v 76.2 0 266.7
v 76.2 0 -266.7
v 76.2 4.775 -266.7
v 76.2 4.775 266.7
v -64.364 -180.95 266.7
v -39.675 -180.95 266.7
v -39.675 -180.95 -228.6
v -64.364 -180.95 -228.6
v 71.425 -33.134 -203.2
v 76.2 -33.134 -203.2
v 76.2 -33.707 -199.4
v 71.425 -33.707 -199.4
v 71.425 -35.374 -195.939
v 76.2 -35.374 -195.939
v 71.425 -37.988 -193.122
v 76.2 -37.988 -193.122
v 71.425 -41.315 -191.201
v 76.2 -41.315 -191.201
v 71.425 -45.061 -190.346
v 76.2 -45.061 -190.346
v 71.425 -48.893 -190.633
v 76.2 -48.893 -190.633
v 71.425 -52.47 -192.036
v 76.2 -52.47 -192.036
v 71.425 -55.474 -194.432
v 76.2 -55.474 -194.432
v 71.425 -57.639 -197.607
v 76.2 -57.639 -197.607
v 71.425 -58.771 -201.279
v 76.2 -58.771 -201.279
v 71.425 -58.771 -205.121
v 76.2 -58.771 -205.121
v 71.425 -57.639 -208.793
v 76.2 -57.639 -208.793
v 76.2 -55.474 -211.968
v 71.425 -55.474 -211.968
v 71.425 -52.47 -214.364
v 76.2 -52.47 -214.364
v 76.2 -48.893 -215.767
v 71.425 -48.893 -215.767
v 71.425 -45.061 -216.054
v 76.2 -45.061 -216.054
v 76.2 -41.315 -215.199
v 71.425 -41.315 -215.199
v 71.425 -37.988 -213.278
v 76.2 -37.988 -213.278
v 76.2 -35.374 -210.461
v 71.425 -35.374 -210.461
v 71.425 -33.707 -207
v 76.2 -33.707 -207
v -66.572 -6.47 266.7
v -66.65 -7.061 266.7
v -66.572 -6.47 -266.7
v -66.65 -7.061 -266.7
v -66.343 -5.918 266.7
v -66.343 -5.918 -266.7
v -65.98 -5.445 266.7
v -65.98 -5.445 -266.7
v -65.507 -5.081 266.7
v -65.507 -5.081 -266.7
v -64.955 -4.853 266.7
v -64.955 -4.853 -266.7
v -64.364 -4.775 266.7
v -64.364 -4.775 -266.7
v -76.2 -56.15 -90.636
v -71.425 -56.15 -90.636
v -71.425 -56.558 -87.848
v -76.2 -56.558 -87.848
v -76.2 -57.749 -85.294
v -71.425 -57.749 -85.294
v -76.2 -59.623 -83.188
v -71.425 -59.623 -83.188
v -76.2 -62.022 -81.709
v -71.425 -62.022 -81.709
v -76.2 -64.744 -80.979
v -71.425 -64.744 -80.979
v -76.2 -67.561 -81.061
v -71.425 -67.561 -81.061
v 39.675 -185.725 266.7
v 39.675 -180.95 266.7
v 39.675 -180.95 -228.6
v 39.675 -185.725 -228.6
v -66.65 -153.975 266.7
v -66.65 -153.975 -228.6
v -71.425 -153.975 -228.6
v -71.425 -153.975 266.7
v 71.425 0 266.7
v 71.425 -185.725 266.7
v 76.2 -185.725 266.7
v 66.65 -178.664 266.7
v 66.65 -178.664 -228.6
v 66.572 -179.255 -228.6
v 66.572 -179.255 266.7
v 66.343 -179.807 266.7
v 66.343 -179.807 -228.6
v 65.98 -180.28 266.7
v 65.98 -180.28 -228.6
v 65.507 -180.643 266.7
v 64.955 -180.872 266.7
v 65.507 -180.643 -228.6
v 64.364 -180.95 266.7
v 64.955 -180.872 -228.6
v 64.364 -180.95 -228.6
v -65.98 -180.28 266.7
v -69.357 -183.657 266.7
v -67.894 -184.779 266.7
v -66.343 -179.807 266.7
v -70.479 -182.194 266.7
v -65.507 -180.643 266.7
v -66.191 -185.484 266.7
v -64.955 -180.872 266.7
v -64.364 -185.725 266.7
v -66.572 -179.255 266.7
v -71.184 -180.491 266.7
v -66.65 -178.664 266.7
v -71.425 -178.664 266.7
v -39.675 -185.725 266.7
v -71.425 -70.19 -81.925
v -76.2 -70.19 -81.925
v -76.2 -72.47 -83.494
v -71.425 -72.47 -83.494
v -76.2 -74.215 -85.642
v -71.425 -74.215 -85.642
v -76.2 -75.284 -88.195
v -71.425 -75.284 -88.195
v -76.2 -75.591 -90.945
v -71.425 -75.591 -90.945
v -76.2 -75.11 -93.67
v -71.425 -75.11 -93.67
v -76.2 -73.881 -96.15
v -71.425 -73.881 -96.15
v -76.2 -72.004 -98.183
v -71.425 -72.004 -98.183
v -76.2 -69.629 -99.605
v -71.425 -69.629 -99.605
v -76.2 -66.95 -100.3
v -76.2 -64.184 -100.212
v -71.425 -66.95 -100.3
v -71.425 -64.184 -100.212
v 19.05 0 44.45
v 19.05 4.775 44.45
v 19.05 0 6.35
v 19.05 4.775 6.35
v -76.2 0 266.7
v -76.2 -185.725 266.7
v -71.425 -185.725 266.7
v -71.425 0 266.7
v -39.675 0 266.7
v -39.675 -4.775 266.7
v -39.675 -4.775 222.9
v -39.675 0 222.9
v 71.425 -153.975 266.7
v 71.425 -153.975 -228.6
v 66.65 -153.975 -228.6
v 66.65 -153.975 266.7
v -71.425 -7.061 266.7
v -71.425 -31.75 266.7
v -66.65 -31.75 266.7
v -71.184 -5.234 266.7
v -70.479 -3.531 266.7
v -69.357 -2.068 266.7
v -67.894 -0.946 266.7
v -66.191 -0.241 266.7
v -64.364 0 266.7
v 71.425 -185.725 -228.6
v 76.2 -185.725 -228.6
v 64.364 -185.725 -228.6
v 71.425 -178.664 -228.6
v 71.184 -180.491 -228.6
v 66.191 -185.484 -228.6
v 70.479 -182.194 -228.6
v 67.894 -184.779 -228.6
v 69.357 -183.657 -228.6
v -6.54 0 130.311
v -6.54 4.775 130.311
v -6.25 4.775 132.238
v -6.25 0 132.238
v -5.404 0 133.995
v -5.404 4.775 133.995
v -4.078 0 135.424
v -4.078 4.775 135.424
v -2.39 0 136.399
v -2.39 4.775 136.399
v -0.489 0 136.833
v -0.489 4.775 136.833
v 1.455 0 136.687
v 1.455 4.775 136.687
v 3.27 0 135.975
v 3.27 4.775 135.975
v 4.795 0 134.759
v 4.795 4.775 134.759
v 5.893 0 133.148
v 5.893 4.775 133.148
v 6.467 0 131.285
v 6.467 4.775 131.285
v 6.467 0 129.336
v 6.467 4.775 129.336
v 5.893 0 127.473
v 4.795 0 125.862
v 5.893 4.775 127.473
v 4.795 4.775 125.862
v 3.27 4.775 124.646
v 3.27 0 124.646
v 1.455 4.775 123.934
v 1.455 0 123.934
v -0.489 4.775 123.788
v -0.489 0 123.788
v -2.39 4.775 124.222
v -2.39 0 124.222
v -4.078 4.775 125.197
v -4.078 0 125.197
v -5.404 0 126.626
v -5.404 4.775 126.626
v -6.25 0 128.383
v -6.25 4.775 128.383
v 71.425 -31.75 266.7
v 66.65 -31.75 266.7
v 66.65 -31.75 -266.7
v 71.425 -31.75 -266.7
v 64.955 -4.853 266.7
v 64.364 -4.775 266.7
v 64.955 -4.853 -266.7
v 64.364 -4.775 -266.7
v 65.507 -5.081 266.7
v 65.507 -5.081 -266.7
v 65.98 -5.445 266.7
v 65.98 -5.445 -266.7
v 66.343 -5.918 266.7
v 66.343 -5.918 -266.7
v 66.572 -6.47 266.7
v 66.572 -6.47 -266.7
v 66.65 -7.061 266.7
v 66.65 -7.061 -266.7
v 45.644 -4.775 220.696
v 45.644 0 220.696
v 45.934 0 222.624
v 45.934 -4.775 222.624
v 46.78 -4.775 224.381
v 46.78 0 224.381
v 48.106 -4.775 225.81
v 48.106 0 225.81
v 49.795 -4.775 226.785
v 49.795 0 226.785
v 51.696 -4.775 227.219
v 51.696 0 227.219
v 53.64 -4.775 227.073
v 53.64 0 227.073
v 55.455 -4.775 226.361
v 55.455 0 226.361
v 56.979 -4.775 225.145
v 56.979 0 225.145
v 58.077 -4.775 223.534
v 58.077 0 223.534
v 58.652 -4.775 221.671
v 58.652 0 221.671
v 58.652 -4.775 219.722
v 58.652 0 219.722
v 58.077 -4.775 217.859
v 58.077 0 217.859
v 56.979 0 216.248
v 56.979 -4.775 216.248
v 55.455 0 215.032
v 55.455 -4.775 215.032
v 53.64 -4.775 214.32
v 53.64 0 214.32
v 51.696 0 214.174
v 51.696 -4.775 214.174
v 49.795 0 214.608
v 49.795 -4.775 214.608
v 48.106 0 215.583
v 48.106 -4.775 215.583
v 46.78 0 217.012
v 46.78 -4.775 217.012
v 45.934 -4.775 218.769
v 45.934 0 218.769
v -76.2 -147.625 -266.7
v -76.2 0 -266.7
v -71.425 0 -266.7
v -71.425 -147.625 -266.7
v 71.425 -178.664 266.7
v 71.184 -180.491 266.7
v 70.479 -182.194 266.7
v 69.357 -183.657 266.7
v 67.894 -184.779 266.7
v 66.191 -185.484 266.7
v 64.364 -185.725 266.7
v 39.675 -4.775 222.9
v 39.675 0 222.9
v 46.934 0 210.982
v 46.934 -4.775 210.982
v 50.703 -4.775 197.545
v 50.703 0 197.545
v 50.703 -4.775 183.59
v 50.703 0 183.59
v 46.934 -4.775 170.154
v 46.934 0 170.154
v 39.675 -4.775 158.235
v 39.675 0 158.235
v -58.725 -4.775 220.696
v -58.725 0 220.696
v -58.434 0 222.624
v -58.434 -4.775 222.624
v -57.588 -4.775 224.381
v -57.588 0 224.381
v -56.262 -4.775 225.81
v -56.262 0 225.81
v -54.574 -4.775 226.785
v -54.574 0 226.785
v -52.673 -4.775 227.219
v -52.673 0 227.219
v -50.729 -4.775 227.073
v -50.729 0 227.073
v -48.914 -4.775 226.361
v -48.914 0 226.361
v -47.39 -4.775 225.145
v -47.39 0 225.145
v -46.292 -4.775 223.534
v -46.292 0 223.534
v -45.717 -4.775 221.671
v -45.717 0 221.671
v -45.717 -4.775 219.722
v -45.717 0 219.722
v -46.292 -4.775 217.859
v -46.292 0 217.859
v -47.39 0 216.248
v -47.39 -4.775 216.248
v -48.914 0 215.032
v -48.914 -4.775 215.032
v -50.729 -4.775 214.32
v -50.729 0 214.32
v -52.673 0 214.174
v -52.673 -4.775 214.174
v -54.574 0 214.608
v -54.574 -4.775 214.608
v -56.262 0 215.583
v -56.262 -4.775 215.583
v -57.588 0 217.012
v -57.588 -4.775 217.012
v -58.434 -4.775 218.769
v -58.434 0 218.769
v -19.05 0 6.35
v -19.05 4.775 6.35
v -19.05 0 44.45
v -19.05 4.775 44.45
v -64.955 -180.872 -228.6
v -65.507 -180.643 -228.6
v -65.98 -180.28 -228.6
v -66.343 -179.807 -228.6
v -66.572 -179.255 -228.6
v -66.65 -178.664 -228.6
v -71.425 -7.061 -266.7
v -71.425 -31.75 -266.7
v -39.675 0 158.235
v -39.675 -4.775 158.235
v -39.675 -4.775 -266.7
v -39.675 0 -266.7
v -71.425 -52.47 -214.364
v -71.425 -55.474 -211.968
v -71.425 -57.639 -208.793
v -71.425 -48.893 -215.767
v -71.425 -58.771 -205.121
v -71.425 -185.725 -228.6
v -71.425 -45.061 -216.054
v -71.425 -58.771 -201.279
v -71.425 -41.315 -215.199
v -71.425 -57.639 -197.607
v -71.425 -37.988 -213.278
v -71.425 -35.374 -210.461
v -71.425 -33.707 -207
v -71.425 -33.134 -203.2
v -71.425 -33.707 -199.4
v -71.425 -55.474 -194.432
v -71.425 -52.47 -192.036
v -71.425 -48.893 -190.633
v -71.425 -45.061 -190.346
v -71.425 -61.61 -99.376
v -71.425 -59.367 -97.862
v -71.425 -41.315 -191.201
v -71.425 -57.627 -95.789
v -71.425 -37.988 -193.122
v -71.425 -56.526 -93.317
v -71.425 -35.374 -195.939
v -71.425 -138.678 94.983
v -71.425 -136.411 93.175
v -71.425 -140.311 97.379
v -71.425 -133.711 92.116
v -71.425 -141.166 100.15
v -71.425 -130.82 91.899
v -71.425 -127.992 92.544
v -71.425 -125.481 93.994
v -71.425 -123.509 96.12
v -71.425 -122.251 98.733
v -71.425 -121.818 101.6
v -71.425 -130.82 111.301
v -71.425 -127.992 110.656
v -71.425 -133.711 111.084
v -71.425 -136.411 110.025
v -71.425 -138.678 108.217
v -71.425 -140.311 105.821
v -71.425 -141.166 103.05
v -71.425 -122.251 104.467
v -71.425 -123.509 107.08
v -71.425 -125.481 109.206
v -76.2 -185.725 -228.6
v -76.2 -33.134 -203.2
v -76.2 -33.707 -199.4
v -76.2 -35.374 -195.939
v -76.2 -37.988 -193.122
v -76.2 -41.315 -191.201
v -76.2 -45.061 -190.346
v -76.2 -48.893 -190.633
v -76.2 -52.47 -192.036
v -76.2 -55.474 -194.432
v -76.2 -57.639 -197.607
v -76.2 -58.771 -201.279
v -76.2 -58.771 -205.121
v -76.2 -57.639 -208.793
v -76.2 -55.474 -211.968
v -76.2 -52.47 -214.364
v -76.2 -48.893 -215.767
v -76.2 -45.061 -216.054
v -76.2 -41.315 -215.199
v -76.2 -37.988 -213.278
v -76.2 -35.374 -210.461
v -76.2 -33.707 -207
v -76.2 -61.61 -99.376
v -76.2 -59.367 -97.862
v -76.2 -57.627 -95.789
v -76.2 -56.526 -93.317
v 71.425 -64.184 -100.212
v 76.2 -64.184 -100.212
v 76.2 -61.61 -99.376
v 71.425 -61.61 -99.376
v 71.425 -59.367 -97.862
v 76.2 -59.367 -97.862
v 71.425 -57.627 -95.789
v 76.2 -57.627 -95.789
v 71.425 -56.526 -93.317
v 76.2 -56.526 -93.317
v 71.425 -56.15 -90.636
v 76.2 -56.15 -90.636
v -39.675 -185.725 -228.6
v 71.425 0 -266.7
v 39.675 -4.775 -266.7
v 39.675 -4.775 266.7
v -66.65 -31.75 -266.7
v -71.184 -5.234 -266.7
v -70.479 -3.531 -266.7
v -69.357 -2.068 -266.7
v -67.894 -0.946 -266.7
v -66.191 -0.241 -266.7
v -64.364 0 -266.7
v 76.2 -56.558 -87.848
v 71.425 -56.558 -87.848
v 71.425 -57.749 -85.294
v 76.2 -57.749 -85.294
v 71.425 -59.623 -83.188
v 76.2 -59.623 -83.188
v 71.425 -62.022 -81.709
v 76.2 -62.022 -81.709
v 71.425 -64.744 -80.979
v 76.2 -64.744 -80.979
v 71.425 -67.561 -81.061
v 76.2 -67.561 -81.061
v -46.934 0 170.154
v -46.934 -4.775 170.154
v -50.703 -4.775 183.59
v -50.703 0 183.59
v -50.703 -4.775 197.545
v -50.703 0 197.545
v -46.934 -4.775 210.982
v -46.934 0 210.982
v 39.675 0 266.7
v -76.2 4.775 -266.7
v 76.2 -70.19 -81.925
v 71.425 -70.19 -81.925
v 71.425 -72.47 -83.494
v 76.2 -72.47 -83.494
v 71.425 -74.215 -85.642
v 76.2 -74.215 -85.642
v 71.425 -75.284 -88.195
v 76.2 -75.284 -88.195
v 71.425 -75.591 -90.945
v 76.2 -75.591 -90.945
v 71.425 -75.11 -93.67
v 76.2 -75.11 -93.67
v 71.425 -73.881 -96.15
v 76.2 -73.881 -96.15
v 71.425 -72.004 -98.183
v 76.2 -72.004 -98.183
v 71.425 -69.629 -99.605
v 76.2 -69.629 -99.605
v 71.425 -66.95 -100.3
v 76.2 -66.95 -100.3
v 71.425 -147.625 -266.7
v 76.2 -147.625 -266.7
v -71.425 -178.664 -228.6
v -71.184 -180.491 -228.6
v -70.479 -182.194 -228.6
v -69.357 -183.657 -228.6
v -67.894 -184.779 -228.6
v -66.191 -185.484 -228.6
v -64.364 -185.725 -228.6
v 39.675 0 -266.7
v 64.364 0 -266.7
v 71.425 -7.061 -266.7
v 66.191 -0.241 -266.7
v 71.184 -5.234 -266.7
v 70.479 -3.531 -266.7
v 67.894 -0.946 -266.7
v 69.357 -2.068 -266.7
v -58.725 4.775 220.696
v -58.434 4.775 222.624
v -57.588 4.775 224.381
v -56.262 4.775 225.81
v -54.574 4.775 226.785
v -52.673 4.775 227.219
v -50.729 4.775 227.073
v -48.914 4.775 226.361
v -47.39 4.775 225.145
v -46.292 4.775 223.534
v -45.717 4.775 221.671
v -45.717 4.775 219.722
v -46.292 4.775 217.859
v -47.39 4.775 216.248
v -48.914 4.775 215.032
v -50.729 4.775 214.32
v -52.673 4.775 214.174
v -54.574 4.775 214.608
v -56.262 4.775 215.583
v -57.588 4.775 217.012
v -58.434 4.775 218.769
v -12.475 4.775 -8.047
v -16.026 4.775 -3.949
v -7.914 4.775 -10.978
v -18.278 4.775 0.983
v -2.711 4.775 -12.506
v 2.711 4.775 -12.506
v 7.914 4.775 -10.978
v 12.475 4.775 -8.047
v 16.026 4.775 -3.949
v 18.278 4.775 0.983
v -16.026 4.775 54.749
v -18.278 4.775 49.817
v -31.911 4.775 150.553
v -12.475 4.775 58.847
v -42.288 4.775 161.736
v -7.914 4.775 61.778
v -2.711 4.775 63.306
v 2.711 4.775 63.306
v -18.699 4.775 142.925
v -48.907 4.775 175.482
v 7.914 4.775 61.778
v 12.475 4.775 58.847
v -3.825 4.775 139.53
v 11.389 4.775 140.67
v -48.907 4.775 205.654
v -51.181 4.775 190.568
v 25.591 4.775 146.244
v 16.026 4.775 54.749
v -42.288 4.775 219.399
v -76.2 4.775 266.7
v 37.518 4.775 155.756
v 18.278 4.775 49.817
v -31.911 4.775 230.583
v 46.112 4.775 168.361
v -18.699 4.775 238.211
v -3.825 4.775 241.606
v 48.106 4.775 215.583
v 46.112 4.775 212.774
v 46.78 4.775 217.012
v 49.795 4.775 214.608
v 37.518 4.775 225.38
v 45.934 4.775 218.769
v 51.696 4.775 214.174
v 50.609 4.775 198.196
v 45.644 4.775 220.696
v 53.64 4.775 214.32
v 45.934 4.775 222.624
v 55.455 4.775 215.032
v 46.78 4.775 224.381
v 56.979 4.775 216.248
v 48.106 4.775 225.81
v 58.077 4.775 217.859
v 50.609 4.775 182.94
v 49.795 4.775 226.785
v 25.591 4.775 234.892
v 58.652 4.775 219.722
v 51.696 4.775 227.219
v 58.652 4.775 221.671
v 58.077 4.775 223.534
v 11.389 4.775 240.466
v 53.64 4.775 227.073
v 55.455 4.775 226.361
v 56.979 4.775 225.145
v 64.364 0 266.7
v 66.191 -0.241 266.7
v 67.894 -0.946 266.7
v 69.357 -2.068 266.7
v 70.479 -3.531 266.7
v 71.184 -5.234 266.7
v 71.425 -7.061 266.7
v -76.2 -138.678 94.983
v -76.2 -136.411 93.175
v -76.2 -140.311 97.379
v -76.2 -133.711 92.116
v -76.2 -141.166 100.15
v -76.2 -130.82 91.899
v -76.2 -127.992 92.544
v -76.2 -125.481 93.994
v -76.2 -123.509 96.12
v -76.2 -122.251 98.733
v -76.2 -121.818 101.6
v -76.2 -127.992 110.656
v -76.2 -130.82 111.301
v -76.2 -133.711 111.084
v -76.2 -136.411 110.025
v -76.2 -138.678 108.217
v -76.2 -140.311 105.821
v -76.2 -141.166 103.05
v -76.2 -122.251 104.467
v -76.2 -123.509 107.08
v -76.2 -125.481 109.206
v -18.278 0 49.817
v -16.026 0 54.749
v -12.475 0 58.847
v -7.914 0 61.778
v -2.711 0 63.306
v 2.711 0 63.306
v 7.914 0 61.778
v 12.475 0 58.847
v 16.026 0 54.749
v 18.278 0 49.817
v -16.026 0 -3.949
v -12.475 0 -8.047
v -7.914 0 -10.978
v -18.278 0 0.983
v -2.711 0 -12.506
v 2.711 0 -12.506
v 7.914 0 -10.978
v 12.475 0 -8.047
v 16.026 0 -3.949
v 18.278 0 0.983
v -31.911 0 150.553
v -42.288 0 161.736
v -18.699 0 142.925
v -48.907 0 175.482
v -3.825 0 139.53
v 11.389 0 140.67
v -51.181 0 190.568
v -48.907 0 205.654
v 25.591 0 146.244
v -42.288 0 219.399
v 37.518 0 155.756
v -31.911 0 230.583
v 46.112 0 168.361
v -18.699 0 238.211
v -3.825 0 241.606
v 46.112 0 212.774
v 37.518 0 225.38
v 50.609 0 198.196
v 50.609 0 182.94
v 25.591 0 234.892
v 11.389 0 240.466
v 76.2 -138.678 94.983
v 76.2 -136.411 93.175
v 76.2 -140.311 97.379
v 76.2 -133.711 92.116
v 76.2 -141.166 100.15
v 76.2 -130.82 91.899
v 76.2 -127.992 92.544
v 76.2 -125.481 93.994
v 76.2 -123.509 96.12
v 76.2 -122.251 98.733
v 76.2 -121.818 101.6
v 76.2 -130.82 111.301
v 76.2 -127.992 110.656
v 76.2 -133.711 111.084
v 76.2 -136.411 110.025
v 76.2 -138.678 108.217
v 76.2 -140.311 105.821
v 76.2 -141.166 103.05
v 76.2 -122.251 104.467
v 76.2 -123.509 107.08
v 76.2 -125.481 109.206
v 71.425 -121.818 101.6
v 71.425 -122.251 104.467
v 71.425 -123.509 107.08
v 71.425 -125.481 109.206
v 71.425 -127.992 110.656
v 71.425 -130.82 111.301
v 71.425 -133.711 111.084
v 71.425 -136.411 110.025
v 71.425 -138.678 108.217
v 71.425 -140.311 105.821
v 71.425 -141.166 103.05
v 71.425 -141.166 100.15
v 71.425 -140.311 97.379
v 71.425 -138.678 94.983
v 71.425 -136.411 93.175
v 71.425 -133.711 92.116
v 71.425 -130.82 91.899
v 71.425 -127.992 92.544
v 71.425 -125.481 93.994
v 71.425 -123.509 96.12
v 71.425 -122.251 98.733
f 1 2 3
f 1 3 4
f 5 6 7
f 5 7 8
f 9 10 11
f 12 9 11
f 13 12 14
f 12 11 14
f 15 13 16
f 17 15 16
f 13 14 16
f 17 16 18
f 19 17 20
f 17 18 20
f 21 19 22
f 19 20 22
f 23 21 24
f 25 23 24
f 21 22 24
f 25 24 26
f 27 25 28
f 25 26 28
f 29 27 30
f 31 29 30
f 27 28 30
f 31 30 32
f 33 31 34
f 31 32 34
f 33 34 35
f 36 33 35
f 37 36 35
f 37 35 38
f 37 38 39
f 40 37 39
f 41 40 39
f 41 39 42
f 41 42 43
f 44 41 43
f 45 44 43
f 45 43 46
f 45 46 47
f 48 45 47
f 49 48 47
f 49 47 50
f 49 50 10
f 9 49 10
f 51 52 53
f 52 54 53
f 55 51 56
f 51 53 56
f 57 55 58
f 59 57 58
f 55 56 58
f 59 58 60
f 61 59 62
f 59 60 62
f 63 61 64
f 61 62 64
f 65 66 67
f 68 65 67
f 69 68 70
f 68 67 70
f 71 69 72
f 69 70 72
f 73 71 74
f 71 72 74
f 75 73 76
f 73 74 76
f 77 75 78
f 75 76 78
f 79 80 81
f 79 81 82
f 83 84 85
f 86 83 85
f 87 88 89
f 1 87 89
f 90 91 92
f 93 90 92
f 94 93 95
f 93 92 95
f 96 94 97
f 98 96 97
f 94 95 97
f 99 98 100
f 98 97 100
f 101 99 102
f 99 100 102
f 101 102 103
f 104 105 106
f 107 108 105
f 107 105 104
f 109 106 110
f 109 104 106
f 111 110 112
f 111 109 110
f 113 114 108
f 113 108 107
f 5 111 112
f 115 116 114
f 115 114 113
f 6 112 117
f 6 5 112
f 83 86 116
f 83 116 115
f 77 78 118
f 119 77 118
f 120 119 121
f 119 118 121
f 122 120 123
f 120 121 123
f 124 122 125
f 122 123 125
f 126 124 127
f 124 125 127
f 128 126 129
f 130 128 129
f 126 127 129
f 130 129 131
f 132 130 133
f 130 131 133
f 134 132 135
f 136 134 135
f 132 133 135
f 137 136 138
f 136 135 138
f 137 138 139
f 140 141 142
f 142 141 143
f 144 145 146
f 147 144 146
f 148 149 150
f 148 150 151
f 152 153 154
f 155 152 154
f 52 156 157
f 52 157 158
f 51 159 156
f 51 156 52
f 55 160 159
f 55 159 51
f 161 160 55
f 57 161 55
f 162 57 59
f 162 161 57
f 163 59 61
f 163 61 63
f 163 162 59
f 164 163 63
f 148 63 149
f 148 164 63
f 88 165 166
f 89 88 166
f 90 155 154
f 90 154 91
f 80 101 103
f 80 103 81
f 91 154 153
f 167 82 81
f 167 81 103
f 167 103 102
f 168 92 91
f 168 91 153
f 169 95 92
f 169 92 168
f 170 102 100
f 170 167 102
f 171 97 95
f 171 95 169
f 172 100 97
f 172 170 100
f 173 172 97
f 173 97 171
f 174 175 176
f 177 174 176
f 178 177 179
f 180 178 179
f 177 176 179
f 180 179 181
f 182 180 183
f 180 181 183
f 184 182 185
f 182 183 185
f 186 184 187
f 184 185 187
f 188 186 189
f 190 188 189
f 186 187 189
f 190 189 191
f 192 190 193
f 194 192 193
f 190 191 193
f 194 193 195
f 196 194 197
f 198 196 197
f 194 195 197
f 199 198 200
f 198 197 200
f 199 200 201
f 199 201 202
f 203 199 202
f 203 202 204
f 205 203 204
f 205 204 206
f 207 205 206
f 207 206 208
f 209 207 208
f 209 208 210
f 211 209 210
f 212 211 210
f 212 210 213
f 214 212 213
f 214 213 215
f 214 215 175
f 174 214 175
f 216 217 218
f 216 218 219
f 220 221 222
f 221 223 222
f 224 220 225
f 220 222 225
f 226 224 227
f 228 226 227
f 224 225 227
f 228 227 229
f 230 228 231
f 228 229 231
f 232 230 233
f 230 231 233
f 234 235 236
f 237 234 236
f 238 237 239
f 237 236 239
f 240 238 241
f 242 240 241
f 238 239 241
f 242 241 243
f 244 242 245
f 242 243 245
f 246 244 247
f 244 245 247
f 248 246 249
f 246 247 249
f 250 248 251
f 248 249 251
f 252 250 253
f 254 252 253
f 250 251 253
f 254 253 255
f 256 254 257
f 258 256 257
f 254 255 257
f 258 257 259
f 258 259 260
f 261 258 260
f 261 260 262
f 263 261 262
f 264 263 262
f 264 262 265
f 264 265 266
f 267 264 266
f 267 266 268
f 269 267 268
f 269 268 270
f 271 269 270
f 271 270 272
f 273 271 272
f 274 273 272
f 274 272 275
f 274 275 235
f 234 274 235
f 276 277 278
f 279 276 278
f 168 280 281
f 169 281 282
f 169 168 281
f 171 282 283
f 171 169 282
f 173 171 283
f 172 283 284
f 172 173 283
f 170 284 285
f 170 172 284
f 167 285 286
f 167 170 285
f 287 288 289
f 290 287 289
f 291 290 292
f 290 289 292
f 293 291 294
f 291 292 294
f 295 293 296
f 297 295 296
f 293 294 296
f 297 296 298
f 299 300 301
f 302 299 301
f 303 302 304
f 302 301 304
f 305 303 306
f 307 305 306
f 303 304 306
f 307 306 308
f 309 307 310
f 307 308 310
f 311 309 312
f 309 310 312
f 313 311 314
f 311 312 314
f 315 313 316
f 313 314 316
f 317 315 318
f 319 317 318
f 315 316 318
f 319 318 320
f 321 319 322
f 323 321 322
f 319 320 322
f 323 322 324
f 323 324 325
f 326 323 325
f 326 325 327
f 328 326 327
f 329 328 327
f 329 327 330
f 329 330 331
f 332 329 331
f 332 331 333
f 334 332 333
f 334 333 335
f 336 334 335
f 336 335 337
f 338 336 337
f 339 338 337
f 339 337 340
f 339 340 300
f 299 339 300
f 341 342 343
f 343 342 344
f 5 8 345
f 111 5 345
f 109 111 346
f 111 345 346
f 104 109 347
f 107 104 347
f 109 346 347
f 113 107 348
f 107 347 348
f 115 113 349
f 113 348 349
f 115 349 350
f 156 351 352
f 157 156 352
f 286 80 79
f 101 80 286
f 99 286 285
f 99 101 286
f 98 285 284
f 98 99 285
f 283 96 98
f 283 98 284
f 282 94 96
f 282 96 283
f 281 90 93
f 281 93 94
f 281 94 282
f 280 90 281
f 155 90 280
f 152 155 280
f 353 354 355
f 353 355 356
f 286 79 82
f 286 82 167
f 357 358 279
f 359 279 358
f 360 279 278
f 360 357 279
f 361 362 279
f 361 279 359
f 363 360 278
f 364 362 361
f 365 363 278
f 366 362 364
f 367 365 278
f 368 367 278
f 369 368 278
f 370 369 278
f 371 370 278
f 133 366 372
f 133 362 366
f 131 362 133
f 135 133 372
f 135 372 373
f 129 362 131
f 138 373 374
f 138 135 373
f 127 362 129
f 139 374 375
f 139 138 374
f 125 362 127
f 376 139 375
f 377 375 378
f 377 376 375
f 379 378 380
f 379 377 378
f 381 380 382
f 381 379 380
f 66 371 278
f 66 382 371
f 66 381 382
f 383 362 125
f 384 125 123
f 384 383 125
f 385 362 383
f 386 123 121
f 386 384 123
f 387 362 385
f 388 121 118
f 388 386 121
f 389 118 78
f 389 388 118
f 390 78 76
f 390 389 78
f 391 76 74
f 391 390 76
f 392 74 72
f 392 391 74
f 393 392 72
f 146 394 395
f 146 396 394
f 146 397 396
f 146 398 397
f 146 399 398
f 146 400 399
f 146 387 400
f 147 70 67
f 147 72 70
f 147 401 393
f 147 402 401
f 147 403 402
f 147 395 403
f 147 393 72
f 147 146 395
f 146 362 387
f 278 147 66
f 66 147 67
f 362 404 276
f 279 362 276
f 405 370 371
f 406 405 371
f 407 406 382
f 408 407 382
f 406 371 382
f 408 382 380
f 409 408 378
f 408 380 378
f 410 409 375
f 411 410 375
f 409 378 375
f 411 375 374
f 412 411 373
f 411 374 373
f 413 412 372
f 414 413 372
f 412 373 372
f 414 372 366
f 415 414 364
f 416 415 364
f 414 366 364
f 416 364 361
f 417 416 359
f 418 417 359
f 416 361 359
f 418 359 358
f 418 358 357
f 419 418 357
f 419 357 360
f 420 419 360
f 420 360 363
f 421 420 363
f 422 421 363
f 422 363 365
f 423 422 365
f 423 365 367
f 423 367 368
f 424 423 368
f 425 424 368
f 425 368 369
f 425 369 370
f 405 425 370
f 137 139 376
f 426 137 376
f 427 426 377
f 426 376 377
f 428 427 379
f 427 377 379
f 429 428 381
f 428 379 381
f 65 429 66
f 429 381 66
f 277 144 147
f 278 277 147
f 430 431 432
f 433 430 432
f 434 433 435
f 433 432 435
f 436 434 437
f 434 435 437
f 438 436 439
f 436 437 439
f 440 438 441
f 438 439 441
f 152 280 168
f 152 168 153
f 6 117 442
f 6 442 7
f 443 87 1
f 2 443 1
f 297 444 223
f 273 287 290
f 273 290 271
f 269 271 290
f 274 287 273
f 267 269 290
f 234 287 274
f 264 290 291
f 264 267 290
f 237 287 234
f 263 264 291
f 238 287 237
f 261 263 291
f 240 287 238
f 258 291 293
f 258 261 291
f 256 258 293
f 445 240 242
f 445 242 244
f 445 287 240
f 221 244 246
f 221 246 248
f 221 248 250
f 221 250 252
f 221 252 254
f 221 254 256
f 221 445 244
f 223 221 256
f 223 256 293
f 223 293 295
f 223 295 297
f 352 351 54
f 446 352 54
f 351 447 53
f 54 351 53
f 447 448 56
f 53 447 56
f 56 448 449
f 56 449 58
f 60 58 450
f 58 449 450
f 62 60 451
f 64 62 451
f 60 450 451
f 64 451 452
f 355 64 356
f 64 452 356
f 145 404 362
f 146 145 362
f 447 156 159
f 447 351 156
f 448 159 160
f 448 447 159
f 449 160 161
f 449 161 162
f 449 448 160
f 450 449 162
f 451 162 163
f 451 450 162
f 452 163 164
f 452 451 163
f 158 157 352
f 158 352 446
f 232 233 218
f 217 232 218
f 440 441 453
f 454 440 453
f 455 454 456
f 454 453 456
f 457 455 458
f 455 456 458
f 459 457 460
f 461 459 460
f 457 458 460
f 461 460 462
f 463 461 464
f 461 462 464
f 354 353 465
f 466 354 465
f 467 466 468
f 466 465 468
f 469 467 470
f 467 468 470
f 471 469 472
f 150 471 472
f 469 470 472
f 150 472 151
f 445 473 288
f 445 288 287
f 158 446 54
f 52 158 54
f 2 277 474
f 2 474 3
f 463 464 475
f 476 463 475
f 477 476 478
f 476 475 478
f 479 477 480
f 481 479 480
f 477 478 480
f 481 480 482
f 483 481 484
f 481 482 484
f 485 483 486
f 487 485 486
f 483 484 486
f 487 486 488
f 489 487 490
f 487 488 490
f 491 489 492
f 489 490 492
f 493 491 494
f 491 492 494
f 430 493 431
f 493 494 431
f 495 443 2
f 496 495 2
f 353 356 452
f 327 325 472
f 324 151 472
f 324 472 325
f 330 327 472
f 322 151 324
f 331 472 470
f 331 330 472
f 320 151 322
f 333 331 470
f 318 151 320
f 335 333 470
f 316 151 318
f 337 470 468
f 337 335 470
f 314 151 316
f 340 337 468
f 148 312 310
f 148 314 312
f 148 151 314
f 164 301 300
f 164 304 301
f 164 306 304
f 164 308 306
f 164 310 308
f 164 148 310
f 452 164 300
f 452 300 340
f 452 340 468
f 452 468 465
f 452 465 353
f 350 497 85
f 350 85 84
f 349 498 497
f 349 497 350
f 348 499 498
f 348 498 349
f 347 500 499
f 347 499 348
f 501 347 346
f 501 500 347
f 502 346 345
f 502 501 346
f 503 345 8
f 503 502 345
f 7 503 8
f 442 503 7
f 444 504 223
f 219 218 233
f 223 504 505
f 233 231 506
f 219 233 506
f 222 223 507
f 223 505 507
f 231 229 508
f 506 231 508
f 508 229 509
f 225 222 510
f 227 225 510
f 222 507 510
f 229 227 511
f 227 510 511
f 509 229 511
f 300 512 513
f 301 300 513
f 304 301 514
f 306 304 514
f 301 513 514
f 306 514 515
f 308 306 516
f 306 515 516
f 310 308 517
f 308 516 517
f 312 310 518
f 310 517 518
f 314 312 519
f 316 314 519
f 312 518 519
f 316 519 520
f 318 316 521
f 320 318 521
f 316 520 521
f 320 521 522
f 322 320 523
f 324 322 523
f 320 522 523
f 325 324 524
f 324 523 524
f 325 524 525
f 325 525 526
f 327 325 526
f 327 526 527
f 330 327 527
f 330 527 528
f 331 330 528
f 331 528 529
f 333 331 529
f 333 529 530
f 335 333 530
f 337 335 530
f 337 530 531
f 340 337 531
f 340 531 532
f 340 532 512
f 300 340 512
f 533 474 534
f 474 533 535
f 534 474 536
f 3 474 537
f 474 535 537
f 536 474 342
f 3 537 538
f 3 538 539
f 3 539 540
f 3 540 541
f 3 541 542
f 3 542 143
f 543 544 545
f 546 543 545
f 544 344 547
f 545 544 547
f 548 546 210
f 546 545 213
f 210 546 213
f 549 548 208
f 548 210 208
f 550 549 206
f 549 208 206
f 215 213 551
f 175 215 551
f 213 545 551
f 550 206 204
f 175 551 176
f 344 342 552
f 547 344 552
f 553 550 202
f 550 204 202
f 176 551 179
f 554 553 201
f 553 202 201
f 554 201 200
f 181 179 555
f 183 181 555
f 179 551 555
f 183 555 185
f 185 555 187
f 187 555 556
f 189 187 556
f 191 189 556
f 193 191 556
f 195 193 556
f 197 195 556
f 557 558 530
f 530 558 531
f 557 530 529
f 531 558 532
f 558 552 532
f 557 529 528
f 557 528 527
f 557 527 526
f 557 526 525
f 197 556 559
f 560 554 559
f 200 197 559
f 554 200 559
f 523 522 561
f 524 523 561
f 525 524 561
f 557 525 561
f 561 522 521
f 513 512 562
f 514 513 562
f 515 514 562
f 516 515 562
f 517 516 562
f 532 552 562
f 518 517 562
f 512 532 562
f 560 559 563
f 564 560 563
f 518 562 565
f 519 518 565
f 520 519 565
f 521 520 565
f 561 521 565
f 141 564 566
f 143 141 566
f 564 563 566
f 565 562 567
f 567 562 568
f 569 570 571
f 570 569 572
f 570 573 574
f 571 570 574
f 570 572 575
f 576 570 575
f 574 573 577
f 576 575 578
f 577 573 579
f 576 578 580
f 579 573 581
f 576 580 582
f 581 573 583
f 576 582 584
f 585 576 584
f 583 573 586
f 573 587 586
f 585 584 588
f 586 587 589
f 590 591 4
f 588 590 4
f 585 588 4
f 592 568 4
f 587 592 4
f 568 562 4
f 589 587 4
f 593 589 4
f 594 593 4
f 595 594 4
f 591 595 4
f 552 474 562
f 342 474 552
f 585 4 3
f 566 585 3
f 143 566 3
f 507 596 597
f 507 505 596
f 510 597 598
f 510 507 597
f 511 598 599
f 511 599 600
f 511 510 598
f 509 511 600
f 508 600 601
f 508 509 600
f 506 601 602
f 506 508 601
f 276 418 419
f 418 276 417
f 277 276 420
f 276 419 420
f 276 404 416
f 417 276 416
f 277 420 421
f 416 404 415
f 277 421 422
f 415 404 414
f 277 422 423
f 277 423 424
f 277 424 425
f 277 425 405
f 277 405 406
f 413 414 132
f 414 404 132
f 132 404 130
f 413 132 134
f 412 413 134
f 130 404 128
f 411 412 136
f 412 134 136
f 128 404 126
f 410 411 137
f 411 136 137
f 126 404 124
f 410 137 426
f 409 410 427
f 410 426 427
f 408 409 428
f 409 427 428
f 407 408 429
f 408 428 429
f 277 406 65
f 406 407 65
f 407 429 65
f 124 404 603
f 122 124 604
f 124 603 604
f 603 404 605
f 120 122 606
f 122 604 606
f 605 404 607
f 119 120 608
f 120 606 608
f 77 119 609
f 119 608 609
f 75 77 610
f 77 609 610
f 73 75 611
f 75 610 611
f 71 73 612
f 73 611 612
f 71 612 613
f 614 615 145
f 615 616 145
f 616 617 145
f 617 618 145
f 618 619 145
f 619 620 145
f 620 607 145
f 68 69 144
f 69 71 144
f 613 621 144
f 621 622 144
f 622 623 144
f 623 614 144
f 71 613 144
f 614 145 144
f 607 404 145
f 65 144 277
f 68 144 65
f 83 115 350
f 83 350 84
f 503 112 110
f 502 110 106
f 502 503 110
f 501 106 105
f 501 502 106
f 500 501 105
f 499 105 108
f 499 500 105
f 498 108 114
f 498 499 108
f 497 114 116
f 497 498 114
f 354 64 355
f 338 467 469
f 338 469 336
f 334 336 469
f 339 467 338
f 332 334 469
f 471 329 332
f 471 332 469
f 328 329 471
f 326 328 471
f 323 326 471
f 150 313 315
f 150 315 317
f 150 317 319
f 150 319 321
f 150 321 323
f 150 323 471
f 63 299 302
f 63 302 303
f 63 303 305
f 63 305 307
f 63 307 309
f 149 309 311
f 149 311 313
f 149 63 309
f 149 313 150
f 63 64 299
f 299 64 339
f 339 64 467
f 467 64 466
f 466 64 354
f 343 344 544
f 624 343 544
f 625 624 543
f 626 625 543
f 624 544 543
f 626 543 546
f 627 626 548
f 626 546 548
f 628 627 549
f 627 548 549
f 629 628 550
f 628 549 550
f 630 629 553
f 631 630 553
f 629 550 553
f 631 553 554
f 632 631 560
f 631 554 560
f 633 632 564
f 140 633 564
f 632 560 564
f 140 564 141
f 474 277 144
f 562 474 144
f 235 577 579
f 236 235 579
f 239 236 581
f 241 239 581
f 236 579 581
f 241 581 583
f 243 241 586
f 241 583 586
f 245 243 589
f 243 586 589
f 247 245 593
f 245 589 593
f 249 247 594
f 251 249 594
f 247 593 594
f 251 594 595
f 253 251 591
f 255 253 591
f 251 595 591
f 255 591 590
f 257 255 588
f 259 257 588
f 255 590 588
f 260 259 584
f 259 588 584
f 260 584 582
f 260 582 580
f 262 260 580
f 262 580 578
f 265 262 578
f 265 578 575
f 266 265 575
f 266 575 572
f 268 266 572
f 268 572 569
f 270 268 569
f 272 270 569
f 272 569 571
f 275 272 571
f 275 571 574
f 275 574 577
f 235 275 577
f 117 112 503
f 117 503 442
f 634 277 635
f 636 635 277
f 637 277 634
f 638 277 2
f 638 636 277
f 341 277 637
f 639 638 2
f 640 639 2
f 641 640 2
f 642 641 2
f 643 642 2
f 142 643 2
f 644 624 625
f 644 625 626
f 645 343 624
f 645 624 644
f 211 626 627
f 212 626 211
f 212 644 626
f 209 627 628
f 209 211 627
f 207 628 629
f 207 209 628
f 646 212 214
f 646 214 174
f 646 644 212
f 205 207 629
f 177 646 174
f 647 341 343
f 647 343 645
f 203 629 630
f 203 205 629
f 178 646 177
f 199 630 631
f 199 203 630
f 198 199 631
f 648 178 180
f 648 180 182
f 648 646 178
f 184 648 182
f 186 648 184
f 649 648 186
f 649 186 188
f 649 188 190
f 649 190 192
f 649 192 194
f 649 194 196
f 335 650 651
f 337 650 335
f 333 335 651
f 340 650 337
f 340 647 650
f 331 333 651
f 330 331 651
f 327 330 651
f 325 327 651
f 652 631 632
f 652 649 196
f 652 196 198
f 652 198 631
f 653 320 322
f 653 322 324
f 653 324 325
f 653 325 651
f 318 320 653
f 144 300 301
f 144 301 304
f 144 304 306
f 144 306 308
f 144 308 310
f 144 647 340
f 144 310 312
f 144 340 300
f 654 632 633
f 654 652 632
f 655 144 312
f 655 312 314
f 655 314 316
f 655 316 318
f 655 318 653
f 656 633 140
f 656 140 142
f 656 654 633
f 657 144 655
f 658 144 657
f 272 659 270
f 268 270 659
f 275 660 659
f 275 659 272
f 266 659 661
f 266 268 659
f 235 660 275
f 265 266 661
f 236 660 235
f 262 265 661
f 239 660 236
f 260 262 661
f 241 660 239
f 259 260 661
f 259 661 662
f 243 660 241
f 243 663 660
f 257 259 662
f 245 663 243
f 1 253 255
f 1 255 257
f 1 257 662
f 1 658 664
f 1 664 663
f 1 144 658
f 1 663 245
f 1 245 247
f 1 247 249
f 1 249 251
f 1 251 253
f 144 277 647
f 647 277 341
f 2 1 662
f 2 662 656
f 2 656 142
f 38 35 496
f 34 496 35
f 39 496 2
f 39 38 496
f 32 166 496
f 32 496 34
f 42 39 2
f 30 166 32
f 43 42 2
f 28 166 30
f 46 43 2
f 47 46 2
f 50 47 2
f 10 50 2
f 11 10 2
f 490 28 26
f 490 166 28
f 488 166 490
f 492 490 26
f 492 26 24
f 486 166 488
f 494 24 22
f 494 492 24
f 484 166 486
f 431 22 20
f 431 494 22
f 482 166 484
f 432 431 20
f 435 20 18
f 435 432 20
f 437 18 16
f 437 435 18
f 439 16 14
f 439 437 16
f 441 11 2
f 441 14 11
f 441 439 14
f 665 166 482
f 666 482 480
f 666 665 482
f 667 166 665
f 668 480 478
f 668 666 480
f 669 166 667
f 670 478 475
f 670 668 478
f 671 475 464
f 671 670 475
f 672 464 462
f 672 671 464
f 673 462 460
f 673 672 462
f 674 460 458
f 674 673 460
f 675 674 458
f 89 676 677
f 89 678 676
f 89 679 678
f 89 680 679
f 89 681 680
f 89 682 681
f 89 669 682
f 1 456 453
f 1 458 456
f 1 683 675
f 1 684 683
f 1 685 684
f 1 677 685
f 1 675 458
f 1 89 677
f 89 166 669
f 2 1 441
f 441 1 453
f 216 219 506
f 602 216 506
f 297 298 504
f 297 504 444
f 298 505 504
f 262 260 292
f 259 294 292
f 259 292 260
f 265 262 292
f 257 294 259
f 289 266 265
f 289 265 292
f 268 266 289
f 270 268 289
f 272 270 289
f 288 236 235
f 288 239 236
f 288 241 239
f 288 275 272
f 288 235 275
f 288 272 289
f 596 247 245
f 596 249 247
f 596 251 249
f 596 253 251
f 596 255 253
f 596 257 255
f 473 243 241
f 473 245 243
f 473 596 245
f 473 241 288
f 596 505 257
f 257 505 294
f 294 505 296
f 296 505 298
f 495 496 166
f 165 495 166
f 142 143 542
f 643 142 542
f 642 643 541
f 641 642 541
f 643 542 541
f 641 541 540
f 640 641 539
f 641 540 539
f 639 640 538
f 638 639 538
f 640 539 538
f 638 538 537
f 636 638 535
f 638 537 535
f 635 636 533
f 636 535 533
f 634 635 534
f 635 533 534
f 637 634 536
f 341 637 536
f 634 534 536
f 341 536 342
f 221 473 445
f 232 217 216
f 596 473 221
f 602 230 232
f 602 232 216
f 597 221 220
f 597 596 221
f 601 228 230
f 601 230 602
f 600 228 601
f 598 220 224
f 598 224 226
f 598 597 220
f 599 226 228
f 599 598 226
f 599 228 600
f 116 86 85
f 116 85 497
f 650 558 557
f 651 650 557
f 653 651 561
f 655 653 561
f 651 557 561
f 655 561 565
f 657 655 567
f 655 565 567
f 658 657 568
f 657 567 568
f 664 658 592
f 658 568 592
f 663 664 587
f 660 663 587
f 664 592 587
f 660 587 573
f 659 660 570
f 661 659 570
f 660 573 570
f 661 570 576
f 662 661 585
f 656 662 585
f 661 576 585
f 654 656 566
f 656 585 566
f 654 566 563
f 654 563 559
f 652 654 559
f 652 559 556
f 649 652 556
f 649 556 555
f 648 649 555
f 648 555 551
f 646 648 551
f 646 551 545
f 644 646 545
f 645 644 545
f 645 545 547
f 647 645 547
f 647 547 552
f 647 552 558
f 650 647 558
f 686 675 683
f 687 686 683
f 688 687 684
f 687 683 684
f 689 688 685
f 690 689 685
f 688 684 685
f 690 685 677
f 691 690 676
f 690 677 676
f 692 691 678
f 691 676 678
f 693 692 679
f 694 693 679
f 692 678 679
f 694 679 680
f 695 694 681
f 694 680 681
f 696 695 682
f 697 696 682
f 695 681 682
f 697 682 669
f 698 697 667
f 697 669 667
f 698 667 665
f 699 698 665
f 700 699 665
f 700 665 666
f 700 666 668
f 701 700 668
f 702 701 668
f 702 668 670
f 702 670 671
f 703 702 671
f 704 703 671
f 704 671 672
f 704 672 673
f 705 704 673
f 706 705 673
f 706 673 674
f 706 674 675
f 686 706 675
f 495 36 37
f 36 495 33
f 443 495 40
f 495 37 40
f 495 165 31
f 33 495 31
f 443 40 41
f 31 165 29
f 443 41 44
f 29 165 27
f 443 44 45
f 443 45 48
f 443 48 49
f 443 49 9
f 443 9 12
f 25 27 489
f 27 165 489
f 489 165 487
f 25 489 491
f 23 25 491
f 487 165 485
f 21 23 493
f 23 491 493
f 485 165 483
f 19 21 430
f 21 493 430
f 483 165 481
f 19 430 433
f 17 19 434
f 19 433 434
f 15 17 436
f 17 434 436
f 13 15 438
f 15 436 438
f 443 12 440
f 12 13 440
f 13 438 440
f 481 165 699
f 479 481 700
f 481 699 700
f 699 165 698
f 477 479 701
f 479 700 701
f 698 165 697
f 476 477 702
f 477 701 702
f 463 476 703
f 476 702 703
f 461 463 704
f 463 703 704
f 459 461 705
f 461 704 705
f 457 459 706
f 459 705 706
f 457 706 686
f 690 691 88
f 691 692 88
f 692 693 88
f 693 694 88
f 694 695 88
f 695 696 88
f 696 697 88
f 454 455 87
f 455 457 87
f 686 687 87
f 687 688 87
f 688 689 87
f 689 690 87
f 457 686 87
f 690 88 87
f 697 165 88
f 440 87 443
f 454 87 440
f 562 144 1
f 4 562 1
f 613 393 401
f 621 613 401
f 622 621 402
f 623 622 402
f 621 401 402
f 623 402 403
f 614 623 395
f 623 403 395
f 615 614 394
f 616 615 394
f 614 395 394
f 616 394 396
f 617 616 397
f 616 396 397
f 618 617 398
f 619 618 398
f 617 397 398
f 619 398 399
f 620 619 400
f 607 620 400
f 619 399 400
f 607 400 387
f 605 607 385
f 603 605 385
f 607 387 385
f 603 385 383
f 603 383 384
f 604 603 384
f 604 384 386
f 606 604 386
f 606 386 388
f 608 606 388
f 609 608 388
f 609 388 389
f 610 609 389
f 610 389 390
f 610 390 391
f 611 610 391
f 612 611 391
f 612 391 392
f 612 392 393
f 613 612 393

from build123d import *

# Parameters (mm, degrees)
F0_W      = 152.4
F0_H      = 533.4
F1_DEPTH  = 4.7752
F2_R      = 51.181
F2_R_2    = 6.5405
F3_DEPTH  = 25.4
F4_W      = 4.7752
F4_H      = 185.7248
F5_DEPTH  = 533.4
F7_DEPTH  = 533.4
F8_R      = 2.286
F9_R      = 7.0612
F10_R     = 12.8905
F11_DEPTH = 152.401
F12_R     = 9.7282
F13_DEPTH = 152.401
F14_R     = 6.5405
F15_DEPTH = 6.35
F17_DEPTH = 6.35
F19_DEPTH = 4.7752
F21_DEPTH = 4.7752
F23_DEPTH = 38.1


with BuildPart() as f1:
    # F0 (on Front) → F1 (new body)
    with BuildSketch(Plane.XZ):
        Rectangle(F0_W, F0_H)
    extrude(amount=-F1_DEPTH)

    # F2 (on face) → F3 (cut)
    with BuildSketch(Plane(origin=(0, 4.7752, 0), x_dir=(-1, 0, 0), z_dir=(0, 1, 0))):
        with Locations((0, 190.5677606951)):
            Circle(F2_R)
        with Locations((0, 130.3105213901)):
            Circle(F2_R_2)
        with Locations((52.1843, 220.6963803475)):
            Circle(F2_R_2)
        with Locations((-52.1843, 220.6963803475)):
            Circle(F2_R_2)
    extrude(amount=-F3_DEPTH, mode=Mode.SUBTRACT)

    # F16 (on face) → F17 (cut)
    with BuildSketch(Plane(origin=(0, 4.7752, 0), x_dir=(-1, 0, 0), z_dir=(0, 1, 0))):
        with BuildLine():
            Line((19.05, 6.35), (19.05, 44.45))
            ThreePointArc((19.05, 44.45), (0, 63.5), (-19.05, 44.45))
            Line((-19.05, 44.45), (-19.05, 6.35))
            ThreePointArc((-19.05, 6.35), (0, -12.7), (19.05, 6.35))
        make_face()
    extrude(amount=-F17_DEPTH, mode=Mode.SUBTRACT)


with BuildPart() as f5:
    # F4 (on face) → F5 (new body, through all)
    with BuildSketch(Plane.XY.offset(266.7)):
        with Locations((73.8124, -92.8624)):
            Rectangle(F4_W, F4_H)
        with Locations((-73.8124, -92.8624)):
            Rectangle(F4_W, F4_H)
    extrude(amount=-F5_DEPTH)

    # F10 (on face) → F11 (cut, through all)
    with BuildSketch(Plane.YZ.offset(76.2)):
        with Locations((-46.0248, -203.2)):
            Circle(F10_R)
    extrude(amount=-F11_DEPTH, mode=Mode.SUBTRACT)

    # F12 (on face) → F13 (cut, through all)
    with BuildSketch(Plane.YZ.offset(76.2)):
        with BuildLine():
            ThreePointArc((-48.2632118342, -190.5053356598), (-54.3106536827, -213.074695894), (-33.1343, -203.2))
            ThreePointArc((-33.1343, -203.2), (-37.7389463173, -193.325304106), (-48.2632118342, -190.5053356598))
        make_face()
        with BuildLine():
            ThreePointArc((-67.5611887766, -81.0610698712), (-75.4481906668, -92.3248758999), (-64.1843846381, -100.2118777902))
            Line((-64.1843846381, -100.2118777902), (-67.5611887766, -81.0610698712))
        make_face()
        with BuildLine():
            Line((-67.5611887766, -81.0610698712), (-64.1843846381, -100.2118777902))
            ThreePointArc((-64.1843846381, -100.2118777902), (-58.4244446616, -96.8863748942), (-56.1496667073, -90.6364738307))
            ThreePointArc((-56.1496667073, -90.6364738307), (-59.6228856438, -83.1881317849), (-67.5611887766, -81.0610698712))
        make_face()
        with Locations((-131.5466, 101.6)):
            Circle(F12_R)
    extrude(amount=-F13_DEPTH, mode=Mode.SUBTRACT)

    # F18 (on face) → F19 (cut, through all)
    with BuildSketch(Plane.YZ.offset(76.2)):
        Polygon((-185.7248, -228.6), (-185.7248, -266.7), (-147.6248, -266.7), align=None)
    extrude(amount=-F19_DEPTH, mode=Mode.SUBTRACT)

    # F20 (on face) → F21 (cut, through all)
    with BuildSketch(Plane(origin=(-76.2, 0, 0), x_dir=(0, -1, 0), z_dir=(-1, 0, 0))):
        Polygon((147.6248, -266.7), (185.7248, -266.7), (185.7248, -228.6), align=None)
    extrude(amount=-F21_DEPTH, mode=Mode.SUBTRACT)


with BuildPart() as f7:
    # F6 (on face) → F7 (new body)
    with BuildSketch(Plane.XY.offset(266.7)):
        Polygon((-39.6748, 0), (-71.4248, 0), (-71.4248, -31.75), (-66.6496, -31.75), (-66.6496, -4.7752), (-39.6748, -4.7752), align=None)
        Polygon((71.4248, -31.75), (71.4248, 0), (39.6748, 0), (39.6748, -4.7752), (66.6496, -4.7752), (66.6496, -31.75), align=None)
        Polygon((-71.4248, -153.9748), (-71.4248, -185.7248), (-39.6748, -185.7248), (-39.6748, -180.9496), (-66.6496, -180.9496), (-66.6496, -153.9748), align=None)
        Polygon((66.6496, -153.9748), (66.6496, -180.9496), (39.6748, -180.9496), (39.6748, -185.7248), (71.4248, -185.7248), (71.4248, -153.9748), align=None)
    extrude(amount=-F7_DEPTH)

    # F8
    f8_edges = [f7.edges().sort_by_distance(p)[0] for p in [
        (-66.6496, -4.7752, 0),
        (66.6496, -4.7752, 0),
        (-66.6496, -180.9496, 0),
        (66.6496, -180.9496, 0),
    ]]
    fillet(f8_edges, radius=F8_R)

    # F9
    f9_edges = [f7.edges().sort_by_distance(p)[0] for p in [
        (71.4248, 0, 0),
        (71.4248, -185.7248, 0),
        (-71.4248, -185.7248, 0),
        (-71.4248, 0, 0),
    ]]
    fillet(f9_edges, radius=F9_R)

    # F14 (on face) → F15 (cut)
    with BuildSketch(Plane(origin=(0, 0, 0), x_dir=(-1, 0, 0), z_dir=(0, 1, 0))):
        with Locations((-52.1843, 220.6963803475)):
            Circle(F14_R)
        with BuildLine():
            ThreePointArc((-39.6748, 222.9004841492), (-51.181, 190.5677606951), (-39.6748, 158.2350372409))
            Line((-39.6748, 158.2350372409), (-39.6748, 222.9004841492))
        make_face()
        with BuildLine():
            Line((39.6748, 222.9004841492), (39.6748, 158.2350372409))
            ThreePointArc((39.6748, 158.2350372409), (51.181, 190.5677606951), (39.6748, 222.9004841492))
        make_face()
        with Locations((52.1843, 220.6963803475)):
            Circle(F14_R)
    extrude(amount=-F15_DEPTH, mode=Mode.SUBTRACT)

    # F22 (on face) → F23 (cut)
    with BuildSketch(Plane(origin=(0, 0, -266.7), x_dir=(1, 0, 0), z_dir=(0, 0, -1))):
        with BuildLine():
            Line((-39.6748, 180.9496), (-39.6748, 185.7248))
            Line((-39.6748, 185.7248), (-64.3636, 185.7248))
            ThreePointArc((-64.3636, 185.7248), (-69.3566224033, 183.6566224033), (-71.4248, 178.6636))
            Line((-71.4248, 178.6636), (-71.4248, 153.9748))
            Line((-71.4248, 153.9748), (-66.6496, 153.9748))
            Line((-66.6496, 153.9748), (-66.6496, 178.6636))
            ThreePointArc((-66.6496, 178.6636), (-65.9800461018, 180.2800461018), (-64.3636, 180.9496))
            Line((-64.3636, 180.9496), (-39.6748, 180.9496))
        make_face()
        with BuildLine():
            Line((66.6496, 153.9748), (71.4248, 153.9748))
            Line((71.4248, 153.9748), (71.4248, 178.6636))
            ThreePointArc((71.4248, 178.6636), (69.3566224033, 183.6566224033), (64.3636, 185.7248))
            Line((64.3636, 185.7248), (39.6748, 185.7248))
            Line((39.6748, 185.7248), (39.6748, 180.9496))
            Line((39.6748, 180.9496), (64.3636, 180.9496))
            ThreePointArc((64.3636, 180.9496), (65.9800461018, 180.2800461018), (66.6496, 178.6636))
            Line((66.6496, 178.6636), (66.6496, 153.9748))
        make_face()
    extrude(amount=-F23_DEPTH, mode=Mode.SUBTRACT)


solid = Compound([f1.part, f5.part, f7.part])
